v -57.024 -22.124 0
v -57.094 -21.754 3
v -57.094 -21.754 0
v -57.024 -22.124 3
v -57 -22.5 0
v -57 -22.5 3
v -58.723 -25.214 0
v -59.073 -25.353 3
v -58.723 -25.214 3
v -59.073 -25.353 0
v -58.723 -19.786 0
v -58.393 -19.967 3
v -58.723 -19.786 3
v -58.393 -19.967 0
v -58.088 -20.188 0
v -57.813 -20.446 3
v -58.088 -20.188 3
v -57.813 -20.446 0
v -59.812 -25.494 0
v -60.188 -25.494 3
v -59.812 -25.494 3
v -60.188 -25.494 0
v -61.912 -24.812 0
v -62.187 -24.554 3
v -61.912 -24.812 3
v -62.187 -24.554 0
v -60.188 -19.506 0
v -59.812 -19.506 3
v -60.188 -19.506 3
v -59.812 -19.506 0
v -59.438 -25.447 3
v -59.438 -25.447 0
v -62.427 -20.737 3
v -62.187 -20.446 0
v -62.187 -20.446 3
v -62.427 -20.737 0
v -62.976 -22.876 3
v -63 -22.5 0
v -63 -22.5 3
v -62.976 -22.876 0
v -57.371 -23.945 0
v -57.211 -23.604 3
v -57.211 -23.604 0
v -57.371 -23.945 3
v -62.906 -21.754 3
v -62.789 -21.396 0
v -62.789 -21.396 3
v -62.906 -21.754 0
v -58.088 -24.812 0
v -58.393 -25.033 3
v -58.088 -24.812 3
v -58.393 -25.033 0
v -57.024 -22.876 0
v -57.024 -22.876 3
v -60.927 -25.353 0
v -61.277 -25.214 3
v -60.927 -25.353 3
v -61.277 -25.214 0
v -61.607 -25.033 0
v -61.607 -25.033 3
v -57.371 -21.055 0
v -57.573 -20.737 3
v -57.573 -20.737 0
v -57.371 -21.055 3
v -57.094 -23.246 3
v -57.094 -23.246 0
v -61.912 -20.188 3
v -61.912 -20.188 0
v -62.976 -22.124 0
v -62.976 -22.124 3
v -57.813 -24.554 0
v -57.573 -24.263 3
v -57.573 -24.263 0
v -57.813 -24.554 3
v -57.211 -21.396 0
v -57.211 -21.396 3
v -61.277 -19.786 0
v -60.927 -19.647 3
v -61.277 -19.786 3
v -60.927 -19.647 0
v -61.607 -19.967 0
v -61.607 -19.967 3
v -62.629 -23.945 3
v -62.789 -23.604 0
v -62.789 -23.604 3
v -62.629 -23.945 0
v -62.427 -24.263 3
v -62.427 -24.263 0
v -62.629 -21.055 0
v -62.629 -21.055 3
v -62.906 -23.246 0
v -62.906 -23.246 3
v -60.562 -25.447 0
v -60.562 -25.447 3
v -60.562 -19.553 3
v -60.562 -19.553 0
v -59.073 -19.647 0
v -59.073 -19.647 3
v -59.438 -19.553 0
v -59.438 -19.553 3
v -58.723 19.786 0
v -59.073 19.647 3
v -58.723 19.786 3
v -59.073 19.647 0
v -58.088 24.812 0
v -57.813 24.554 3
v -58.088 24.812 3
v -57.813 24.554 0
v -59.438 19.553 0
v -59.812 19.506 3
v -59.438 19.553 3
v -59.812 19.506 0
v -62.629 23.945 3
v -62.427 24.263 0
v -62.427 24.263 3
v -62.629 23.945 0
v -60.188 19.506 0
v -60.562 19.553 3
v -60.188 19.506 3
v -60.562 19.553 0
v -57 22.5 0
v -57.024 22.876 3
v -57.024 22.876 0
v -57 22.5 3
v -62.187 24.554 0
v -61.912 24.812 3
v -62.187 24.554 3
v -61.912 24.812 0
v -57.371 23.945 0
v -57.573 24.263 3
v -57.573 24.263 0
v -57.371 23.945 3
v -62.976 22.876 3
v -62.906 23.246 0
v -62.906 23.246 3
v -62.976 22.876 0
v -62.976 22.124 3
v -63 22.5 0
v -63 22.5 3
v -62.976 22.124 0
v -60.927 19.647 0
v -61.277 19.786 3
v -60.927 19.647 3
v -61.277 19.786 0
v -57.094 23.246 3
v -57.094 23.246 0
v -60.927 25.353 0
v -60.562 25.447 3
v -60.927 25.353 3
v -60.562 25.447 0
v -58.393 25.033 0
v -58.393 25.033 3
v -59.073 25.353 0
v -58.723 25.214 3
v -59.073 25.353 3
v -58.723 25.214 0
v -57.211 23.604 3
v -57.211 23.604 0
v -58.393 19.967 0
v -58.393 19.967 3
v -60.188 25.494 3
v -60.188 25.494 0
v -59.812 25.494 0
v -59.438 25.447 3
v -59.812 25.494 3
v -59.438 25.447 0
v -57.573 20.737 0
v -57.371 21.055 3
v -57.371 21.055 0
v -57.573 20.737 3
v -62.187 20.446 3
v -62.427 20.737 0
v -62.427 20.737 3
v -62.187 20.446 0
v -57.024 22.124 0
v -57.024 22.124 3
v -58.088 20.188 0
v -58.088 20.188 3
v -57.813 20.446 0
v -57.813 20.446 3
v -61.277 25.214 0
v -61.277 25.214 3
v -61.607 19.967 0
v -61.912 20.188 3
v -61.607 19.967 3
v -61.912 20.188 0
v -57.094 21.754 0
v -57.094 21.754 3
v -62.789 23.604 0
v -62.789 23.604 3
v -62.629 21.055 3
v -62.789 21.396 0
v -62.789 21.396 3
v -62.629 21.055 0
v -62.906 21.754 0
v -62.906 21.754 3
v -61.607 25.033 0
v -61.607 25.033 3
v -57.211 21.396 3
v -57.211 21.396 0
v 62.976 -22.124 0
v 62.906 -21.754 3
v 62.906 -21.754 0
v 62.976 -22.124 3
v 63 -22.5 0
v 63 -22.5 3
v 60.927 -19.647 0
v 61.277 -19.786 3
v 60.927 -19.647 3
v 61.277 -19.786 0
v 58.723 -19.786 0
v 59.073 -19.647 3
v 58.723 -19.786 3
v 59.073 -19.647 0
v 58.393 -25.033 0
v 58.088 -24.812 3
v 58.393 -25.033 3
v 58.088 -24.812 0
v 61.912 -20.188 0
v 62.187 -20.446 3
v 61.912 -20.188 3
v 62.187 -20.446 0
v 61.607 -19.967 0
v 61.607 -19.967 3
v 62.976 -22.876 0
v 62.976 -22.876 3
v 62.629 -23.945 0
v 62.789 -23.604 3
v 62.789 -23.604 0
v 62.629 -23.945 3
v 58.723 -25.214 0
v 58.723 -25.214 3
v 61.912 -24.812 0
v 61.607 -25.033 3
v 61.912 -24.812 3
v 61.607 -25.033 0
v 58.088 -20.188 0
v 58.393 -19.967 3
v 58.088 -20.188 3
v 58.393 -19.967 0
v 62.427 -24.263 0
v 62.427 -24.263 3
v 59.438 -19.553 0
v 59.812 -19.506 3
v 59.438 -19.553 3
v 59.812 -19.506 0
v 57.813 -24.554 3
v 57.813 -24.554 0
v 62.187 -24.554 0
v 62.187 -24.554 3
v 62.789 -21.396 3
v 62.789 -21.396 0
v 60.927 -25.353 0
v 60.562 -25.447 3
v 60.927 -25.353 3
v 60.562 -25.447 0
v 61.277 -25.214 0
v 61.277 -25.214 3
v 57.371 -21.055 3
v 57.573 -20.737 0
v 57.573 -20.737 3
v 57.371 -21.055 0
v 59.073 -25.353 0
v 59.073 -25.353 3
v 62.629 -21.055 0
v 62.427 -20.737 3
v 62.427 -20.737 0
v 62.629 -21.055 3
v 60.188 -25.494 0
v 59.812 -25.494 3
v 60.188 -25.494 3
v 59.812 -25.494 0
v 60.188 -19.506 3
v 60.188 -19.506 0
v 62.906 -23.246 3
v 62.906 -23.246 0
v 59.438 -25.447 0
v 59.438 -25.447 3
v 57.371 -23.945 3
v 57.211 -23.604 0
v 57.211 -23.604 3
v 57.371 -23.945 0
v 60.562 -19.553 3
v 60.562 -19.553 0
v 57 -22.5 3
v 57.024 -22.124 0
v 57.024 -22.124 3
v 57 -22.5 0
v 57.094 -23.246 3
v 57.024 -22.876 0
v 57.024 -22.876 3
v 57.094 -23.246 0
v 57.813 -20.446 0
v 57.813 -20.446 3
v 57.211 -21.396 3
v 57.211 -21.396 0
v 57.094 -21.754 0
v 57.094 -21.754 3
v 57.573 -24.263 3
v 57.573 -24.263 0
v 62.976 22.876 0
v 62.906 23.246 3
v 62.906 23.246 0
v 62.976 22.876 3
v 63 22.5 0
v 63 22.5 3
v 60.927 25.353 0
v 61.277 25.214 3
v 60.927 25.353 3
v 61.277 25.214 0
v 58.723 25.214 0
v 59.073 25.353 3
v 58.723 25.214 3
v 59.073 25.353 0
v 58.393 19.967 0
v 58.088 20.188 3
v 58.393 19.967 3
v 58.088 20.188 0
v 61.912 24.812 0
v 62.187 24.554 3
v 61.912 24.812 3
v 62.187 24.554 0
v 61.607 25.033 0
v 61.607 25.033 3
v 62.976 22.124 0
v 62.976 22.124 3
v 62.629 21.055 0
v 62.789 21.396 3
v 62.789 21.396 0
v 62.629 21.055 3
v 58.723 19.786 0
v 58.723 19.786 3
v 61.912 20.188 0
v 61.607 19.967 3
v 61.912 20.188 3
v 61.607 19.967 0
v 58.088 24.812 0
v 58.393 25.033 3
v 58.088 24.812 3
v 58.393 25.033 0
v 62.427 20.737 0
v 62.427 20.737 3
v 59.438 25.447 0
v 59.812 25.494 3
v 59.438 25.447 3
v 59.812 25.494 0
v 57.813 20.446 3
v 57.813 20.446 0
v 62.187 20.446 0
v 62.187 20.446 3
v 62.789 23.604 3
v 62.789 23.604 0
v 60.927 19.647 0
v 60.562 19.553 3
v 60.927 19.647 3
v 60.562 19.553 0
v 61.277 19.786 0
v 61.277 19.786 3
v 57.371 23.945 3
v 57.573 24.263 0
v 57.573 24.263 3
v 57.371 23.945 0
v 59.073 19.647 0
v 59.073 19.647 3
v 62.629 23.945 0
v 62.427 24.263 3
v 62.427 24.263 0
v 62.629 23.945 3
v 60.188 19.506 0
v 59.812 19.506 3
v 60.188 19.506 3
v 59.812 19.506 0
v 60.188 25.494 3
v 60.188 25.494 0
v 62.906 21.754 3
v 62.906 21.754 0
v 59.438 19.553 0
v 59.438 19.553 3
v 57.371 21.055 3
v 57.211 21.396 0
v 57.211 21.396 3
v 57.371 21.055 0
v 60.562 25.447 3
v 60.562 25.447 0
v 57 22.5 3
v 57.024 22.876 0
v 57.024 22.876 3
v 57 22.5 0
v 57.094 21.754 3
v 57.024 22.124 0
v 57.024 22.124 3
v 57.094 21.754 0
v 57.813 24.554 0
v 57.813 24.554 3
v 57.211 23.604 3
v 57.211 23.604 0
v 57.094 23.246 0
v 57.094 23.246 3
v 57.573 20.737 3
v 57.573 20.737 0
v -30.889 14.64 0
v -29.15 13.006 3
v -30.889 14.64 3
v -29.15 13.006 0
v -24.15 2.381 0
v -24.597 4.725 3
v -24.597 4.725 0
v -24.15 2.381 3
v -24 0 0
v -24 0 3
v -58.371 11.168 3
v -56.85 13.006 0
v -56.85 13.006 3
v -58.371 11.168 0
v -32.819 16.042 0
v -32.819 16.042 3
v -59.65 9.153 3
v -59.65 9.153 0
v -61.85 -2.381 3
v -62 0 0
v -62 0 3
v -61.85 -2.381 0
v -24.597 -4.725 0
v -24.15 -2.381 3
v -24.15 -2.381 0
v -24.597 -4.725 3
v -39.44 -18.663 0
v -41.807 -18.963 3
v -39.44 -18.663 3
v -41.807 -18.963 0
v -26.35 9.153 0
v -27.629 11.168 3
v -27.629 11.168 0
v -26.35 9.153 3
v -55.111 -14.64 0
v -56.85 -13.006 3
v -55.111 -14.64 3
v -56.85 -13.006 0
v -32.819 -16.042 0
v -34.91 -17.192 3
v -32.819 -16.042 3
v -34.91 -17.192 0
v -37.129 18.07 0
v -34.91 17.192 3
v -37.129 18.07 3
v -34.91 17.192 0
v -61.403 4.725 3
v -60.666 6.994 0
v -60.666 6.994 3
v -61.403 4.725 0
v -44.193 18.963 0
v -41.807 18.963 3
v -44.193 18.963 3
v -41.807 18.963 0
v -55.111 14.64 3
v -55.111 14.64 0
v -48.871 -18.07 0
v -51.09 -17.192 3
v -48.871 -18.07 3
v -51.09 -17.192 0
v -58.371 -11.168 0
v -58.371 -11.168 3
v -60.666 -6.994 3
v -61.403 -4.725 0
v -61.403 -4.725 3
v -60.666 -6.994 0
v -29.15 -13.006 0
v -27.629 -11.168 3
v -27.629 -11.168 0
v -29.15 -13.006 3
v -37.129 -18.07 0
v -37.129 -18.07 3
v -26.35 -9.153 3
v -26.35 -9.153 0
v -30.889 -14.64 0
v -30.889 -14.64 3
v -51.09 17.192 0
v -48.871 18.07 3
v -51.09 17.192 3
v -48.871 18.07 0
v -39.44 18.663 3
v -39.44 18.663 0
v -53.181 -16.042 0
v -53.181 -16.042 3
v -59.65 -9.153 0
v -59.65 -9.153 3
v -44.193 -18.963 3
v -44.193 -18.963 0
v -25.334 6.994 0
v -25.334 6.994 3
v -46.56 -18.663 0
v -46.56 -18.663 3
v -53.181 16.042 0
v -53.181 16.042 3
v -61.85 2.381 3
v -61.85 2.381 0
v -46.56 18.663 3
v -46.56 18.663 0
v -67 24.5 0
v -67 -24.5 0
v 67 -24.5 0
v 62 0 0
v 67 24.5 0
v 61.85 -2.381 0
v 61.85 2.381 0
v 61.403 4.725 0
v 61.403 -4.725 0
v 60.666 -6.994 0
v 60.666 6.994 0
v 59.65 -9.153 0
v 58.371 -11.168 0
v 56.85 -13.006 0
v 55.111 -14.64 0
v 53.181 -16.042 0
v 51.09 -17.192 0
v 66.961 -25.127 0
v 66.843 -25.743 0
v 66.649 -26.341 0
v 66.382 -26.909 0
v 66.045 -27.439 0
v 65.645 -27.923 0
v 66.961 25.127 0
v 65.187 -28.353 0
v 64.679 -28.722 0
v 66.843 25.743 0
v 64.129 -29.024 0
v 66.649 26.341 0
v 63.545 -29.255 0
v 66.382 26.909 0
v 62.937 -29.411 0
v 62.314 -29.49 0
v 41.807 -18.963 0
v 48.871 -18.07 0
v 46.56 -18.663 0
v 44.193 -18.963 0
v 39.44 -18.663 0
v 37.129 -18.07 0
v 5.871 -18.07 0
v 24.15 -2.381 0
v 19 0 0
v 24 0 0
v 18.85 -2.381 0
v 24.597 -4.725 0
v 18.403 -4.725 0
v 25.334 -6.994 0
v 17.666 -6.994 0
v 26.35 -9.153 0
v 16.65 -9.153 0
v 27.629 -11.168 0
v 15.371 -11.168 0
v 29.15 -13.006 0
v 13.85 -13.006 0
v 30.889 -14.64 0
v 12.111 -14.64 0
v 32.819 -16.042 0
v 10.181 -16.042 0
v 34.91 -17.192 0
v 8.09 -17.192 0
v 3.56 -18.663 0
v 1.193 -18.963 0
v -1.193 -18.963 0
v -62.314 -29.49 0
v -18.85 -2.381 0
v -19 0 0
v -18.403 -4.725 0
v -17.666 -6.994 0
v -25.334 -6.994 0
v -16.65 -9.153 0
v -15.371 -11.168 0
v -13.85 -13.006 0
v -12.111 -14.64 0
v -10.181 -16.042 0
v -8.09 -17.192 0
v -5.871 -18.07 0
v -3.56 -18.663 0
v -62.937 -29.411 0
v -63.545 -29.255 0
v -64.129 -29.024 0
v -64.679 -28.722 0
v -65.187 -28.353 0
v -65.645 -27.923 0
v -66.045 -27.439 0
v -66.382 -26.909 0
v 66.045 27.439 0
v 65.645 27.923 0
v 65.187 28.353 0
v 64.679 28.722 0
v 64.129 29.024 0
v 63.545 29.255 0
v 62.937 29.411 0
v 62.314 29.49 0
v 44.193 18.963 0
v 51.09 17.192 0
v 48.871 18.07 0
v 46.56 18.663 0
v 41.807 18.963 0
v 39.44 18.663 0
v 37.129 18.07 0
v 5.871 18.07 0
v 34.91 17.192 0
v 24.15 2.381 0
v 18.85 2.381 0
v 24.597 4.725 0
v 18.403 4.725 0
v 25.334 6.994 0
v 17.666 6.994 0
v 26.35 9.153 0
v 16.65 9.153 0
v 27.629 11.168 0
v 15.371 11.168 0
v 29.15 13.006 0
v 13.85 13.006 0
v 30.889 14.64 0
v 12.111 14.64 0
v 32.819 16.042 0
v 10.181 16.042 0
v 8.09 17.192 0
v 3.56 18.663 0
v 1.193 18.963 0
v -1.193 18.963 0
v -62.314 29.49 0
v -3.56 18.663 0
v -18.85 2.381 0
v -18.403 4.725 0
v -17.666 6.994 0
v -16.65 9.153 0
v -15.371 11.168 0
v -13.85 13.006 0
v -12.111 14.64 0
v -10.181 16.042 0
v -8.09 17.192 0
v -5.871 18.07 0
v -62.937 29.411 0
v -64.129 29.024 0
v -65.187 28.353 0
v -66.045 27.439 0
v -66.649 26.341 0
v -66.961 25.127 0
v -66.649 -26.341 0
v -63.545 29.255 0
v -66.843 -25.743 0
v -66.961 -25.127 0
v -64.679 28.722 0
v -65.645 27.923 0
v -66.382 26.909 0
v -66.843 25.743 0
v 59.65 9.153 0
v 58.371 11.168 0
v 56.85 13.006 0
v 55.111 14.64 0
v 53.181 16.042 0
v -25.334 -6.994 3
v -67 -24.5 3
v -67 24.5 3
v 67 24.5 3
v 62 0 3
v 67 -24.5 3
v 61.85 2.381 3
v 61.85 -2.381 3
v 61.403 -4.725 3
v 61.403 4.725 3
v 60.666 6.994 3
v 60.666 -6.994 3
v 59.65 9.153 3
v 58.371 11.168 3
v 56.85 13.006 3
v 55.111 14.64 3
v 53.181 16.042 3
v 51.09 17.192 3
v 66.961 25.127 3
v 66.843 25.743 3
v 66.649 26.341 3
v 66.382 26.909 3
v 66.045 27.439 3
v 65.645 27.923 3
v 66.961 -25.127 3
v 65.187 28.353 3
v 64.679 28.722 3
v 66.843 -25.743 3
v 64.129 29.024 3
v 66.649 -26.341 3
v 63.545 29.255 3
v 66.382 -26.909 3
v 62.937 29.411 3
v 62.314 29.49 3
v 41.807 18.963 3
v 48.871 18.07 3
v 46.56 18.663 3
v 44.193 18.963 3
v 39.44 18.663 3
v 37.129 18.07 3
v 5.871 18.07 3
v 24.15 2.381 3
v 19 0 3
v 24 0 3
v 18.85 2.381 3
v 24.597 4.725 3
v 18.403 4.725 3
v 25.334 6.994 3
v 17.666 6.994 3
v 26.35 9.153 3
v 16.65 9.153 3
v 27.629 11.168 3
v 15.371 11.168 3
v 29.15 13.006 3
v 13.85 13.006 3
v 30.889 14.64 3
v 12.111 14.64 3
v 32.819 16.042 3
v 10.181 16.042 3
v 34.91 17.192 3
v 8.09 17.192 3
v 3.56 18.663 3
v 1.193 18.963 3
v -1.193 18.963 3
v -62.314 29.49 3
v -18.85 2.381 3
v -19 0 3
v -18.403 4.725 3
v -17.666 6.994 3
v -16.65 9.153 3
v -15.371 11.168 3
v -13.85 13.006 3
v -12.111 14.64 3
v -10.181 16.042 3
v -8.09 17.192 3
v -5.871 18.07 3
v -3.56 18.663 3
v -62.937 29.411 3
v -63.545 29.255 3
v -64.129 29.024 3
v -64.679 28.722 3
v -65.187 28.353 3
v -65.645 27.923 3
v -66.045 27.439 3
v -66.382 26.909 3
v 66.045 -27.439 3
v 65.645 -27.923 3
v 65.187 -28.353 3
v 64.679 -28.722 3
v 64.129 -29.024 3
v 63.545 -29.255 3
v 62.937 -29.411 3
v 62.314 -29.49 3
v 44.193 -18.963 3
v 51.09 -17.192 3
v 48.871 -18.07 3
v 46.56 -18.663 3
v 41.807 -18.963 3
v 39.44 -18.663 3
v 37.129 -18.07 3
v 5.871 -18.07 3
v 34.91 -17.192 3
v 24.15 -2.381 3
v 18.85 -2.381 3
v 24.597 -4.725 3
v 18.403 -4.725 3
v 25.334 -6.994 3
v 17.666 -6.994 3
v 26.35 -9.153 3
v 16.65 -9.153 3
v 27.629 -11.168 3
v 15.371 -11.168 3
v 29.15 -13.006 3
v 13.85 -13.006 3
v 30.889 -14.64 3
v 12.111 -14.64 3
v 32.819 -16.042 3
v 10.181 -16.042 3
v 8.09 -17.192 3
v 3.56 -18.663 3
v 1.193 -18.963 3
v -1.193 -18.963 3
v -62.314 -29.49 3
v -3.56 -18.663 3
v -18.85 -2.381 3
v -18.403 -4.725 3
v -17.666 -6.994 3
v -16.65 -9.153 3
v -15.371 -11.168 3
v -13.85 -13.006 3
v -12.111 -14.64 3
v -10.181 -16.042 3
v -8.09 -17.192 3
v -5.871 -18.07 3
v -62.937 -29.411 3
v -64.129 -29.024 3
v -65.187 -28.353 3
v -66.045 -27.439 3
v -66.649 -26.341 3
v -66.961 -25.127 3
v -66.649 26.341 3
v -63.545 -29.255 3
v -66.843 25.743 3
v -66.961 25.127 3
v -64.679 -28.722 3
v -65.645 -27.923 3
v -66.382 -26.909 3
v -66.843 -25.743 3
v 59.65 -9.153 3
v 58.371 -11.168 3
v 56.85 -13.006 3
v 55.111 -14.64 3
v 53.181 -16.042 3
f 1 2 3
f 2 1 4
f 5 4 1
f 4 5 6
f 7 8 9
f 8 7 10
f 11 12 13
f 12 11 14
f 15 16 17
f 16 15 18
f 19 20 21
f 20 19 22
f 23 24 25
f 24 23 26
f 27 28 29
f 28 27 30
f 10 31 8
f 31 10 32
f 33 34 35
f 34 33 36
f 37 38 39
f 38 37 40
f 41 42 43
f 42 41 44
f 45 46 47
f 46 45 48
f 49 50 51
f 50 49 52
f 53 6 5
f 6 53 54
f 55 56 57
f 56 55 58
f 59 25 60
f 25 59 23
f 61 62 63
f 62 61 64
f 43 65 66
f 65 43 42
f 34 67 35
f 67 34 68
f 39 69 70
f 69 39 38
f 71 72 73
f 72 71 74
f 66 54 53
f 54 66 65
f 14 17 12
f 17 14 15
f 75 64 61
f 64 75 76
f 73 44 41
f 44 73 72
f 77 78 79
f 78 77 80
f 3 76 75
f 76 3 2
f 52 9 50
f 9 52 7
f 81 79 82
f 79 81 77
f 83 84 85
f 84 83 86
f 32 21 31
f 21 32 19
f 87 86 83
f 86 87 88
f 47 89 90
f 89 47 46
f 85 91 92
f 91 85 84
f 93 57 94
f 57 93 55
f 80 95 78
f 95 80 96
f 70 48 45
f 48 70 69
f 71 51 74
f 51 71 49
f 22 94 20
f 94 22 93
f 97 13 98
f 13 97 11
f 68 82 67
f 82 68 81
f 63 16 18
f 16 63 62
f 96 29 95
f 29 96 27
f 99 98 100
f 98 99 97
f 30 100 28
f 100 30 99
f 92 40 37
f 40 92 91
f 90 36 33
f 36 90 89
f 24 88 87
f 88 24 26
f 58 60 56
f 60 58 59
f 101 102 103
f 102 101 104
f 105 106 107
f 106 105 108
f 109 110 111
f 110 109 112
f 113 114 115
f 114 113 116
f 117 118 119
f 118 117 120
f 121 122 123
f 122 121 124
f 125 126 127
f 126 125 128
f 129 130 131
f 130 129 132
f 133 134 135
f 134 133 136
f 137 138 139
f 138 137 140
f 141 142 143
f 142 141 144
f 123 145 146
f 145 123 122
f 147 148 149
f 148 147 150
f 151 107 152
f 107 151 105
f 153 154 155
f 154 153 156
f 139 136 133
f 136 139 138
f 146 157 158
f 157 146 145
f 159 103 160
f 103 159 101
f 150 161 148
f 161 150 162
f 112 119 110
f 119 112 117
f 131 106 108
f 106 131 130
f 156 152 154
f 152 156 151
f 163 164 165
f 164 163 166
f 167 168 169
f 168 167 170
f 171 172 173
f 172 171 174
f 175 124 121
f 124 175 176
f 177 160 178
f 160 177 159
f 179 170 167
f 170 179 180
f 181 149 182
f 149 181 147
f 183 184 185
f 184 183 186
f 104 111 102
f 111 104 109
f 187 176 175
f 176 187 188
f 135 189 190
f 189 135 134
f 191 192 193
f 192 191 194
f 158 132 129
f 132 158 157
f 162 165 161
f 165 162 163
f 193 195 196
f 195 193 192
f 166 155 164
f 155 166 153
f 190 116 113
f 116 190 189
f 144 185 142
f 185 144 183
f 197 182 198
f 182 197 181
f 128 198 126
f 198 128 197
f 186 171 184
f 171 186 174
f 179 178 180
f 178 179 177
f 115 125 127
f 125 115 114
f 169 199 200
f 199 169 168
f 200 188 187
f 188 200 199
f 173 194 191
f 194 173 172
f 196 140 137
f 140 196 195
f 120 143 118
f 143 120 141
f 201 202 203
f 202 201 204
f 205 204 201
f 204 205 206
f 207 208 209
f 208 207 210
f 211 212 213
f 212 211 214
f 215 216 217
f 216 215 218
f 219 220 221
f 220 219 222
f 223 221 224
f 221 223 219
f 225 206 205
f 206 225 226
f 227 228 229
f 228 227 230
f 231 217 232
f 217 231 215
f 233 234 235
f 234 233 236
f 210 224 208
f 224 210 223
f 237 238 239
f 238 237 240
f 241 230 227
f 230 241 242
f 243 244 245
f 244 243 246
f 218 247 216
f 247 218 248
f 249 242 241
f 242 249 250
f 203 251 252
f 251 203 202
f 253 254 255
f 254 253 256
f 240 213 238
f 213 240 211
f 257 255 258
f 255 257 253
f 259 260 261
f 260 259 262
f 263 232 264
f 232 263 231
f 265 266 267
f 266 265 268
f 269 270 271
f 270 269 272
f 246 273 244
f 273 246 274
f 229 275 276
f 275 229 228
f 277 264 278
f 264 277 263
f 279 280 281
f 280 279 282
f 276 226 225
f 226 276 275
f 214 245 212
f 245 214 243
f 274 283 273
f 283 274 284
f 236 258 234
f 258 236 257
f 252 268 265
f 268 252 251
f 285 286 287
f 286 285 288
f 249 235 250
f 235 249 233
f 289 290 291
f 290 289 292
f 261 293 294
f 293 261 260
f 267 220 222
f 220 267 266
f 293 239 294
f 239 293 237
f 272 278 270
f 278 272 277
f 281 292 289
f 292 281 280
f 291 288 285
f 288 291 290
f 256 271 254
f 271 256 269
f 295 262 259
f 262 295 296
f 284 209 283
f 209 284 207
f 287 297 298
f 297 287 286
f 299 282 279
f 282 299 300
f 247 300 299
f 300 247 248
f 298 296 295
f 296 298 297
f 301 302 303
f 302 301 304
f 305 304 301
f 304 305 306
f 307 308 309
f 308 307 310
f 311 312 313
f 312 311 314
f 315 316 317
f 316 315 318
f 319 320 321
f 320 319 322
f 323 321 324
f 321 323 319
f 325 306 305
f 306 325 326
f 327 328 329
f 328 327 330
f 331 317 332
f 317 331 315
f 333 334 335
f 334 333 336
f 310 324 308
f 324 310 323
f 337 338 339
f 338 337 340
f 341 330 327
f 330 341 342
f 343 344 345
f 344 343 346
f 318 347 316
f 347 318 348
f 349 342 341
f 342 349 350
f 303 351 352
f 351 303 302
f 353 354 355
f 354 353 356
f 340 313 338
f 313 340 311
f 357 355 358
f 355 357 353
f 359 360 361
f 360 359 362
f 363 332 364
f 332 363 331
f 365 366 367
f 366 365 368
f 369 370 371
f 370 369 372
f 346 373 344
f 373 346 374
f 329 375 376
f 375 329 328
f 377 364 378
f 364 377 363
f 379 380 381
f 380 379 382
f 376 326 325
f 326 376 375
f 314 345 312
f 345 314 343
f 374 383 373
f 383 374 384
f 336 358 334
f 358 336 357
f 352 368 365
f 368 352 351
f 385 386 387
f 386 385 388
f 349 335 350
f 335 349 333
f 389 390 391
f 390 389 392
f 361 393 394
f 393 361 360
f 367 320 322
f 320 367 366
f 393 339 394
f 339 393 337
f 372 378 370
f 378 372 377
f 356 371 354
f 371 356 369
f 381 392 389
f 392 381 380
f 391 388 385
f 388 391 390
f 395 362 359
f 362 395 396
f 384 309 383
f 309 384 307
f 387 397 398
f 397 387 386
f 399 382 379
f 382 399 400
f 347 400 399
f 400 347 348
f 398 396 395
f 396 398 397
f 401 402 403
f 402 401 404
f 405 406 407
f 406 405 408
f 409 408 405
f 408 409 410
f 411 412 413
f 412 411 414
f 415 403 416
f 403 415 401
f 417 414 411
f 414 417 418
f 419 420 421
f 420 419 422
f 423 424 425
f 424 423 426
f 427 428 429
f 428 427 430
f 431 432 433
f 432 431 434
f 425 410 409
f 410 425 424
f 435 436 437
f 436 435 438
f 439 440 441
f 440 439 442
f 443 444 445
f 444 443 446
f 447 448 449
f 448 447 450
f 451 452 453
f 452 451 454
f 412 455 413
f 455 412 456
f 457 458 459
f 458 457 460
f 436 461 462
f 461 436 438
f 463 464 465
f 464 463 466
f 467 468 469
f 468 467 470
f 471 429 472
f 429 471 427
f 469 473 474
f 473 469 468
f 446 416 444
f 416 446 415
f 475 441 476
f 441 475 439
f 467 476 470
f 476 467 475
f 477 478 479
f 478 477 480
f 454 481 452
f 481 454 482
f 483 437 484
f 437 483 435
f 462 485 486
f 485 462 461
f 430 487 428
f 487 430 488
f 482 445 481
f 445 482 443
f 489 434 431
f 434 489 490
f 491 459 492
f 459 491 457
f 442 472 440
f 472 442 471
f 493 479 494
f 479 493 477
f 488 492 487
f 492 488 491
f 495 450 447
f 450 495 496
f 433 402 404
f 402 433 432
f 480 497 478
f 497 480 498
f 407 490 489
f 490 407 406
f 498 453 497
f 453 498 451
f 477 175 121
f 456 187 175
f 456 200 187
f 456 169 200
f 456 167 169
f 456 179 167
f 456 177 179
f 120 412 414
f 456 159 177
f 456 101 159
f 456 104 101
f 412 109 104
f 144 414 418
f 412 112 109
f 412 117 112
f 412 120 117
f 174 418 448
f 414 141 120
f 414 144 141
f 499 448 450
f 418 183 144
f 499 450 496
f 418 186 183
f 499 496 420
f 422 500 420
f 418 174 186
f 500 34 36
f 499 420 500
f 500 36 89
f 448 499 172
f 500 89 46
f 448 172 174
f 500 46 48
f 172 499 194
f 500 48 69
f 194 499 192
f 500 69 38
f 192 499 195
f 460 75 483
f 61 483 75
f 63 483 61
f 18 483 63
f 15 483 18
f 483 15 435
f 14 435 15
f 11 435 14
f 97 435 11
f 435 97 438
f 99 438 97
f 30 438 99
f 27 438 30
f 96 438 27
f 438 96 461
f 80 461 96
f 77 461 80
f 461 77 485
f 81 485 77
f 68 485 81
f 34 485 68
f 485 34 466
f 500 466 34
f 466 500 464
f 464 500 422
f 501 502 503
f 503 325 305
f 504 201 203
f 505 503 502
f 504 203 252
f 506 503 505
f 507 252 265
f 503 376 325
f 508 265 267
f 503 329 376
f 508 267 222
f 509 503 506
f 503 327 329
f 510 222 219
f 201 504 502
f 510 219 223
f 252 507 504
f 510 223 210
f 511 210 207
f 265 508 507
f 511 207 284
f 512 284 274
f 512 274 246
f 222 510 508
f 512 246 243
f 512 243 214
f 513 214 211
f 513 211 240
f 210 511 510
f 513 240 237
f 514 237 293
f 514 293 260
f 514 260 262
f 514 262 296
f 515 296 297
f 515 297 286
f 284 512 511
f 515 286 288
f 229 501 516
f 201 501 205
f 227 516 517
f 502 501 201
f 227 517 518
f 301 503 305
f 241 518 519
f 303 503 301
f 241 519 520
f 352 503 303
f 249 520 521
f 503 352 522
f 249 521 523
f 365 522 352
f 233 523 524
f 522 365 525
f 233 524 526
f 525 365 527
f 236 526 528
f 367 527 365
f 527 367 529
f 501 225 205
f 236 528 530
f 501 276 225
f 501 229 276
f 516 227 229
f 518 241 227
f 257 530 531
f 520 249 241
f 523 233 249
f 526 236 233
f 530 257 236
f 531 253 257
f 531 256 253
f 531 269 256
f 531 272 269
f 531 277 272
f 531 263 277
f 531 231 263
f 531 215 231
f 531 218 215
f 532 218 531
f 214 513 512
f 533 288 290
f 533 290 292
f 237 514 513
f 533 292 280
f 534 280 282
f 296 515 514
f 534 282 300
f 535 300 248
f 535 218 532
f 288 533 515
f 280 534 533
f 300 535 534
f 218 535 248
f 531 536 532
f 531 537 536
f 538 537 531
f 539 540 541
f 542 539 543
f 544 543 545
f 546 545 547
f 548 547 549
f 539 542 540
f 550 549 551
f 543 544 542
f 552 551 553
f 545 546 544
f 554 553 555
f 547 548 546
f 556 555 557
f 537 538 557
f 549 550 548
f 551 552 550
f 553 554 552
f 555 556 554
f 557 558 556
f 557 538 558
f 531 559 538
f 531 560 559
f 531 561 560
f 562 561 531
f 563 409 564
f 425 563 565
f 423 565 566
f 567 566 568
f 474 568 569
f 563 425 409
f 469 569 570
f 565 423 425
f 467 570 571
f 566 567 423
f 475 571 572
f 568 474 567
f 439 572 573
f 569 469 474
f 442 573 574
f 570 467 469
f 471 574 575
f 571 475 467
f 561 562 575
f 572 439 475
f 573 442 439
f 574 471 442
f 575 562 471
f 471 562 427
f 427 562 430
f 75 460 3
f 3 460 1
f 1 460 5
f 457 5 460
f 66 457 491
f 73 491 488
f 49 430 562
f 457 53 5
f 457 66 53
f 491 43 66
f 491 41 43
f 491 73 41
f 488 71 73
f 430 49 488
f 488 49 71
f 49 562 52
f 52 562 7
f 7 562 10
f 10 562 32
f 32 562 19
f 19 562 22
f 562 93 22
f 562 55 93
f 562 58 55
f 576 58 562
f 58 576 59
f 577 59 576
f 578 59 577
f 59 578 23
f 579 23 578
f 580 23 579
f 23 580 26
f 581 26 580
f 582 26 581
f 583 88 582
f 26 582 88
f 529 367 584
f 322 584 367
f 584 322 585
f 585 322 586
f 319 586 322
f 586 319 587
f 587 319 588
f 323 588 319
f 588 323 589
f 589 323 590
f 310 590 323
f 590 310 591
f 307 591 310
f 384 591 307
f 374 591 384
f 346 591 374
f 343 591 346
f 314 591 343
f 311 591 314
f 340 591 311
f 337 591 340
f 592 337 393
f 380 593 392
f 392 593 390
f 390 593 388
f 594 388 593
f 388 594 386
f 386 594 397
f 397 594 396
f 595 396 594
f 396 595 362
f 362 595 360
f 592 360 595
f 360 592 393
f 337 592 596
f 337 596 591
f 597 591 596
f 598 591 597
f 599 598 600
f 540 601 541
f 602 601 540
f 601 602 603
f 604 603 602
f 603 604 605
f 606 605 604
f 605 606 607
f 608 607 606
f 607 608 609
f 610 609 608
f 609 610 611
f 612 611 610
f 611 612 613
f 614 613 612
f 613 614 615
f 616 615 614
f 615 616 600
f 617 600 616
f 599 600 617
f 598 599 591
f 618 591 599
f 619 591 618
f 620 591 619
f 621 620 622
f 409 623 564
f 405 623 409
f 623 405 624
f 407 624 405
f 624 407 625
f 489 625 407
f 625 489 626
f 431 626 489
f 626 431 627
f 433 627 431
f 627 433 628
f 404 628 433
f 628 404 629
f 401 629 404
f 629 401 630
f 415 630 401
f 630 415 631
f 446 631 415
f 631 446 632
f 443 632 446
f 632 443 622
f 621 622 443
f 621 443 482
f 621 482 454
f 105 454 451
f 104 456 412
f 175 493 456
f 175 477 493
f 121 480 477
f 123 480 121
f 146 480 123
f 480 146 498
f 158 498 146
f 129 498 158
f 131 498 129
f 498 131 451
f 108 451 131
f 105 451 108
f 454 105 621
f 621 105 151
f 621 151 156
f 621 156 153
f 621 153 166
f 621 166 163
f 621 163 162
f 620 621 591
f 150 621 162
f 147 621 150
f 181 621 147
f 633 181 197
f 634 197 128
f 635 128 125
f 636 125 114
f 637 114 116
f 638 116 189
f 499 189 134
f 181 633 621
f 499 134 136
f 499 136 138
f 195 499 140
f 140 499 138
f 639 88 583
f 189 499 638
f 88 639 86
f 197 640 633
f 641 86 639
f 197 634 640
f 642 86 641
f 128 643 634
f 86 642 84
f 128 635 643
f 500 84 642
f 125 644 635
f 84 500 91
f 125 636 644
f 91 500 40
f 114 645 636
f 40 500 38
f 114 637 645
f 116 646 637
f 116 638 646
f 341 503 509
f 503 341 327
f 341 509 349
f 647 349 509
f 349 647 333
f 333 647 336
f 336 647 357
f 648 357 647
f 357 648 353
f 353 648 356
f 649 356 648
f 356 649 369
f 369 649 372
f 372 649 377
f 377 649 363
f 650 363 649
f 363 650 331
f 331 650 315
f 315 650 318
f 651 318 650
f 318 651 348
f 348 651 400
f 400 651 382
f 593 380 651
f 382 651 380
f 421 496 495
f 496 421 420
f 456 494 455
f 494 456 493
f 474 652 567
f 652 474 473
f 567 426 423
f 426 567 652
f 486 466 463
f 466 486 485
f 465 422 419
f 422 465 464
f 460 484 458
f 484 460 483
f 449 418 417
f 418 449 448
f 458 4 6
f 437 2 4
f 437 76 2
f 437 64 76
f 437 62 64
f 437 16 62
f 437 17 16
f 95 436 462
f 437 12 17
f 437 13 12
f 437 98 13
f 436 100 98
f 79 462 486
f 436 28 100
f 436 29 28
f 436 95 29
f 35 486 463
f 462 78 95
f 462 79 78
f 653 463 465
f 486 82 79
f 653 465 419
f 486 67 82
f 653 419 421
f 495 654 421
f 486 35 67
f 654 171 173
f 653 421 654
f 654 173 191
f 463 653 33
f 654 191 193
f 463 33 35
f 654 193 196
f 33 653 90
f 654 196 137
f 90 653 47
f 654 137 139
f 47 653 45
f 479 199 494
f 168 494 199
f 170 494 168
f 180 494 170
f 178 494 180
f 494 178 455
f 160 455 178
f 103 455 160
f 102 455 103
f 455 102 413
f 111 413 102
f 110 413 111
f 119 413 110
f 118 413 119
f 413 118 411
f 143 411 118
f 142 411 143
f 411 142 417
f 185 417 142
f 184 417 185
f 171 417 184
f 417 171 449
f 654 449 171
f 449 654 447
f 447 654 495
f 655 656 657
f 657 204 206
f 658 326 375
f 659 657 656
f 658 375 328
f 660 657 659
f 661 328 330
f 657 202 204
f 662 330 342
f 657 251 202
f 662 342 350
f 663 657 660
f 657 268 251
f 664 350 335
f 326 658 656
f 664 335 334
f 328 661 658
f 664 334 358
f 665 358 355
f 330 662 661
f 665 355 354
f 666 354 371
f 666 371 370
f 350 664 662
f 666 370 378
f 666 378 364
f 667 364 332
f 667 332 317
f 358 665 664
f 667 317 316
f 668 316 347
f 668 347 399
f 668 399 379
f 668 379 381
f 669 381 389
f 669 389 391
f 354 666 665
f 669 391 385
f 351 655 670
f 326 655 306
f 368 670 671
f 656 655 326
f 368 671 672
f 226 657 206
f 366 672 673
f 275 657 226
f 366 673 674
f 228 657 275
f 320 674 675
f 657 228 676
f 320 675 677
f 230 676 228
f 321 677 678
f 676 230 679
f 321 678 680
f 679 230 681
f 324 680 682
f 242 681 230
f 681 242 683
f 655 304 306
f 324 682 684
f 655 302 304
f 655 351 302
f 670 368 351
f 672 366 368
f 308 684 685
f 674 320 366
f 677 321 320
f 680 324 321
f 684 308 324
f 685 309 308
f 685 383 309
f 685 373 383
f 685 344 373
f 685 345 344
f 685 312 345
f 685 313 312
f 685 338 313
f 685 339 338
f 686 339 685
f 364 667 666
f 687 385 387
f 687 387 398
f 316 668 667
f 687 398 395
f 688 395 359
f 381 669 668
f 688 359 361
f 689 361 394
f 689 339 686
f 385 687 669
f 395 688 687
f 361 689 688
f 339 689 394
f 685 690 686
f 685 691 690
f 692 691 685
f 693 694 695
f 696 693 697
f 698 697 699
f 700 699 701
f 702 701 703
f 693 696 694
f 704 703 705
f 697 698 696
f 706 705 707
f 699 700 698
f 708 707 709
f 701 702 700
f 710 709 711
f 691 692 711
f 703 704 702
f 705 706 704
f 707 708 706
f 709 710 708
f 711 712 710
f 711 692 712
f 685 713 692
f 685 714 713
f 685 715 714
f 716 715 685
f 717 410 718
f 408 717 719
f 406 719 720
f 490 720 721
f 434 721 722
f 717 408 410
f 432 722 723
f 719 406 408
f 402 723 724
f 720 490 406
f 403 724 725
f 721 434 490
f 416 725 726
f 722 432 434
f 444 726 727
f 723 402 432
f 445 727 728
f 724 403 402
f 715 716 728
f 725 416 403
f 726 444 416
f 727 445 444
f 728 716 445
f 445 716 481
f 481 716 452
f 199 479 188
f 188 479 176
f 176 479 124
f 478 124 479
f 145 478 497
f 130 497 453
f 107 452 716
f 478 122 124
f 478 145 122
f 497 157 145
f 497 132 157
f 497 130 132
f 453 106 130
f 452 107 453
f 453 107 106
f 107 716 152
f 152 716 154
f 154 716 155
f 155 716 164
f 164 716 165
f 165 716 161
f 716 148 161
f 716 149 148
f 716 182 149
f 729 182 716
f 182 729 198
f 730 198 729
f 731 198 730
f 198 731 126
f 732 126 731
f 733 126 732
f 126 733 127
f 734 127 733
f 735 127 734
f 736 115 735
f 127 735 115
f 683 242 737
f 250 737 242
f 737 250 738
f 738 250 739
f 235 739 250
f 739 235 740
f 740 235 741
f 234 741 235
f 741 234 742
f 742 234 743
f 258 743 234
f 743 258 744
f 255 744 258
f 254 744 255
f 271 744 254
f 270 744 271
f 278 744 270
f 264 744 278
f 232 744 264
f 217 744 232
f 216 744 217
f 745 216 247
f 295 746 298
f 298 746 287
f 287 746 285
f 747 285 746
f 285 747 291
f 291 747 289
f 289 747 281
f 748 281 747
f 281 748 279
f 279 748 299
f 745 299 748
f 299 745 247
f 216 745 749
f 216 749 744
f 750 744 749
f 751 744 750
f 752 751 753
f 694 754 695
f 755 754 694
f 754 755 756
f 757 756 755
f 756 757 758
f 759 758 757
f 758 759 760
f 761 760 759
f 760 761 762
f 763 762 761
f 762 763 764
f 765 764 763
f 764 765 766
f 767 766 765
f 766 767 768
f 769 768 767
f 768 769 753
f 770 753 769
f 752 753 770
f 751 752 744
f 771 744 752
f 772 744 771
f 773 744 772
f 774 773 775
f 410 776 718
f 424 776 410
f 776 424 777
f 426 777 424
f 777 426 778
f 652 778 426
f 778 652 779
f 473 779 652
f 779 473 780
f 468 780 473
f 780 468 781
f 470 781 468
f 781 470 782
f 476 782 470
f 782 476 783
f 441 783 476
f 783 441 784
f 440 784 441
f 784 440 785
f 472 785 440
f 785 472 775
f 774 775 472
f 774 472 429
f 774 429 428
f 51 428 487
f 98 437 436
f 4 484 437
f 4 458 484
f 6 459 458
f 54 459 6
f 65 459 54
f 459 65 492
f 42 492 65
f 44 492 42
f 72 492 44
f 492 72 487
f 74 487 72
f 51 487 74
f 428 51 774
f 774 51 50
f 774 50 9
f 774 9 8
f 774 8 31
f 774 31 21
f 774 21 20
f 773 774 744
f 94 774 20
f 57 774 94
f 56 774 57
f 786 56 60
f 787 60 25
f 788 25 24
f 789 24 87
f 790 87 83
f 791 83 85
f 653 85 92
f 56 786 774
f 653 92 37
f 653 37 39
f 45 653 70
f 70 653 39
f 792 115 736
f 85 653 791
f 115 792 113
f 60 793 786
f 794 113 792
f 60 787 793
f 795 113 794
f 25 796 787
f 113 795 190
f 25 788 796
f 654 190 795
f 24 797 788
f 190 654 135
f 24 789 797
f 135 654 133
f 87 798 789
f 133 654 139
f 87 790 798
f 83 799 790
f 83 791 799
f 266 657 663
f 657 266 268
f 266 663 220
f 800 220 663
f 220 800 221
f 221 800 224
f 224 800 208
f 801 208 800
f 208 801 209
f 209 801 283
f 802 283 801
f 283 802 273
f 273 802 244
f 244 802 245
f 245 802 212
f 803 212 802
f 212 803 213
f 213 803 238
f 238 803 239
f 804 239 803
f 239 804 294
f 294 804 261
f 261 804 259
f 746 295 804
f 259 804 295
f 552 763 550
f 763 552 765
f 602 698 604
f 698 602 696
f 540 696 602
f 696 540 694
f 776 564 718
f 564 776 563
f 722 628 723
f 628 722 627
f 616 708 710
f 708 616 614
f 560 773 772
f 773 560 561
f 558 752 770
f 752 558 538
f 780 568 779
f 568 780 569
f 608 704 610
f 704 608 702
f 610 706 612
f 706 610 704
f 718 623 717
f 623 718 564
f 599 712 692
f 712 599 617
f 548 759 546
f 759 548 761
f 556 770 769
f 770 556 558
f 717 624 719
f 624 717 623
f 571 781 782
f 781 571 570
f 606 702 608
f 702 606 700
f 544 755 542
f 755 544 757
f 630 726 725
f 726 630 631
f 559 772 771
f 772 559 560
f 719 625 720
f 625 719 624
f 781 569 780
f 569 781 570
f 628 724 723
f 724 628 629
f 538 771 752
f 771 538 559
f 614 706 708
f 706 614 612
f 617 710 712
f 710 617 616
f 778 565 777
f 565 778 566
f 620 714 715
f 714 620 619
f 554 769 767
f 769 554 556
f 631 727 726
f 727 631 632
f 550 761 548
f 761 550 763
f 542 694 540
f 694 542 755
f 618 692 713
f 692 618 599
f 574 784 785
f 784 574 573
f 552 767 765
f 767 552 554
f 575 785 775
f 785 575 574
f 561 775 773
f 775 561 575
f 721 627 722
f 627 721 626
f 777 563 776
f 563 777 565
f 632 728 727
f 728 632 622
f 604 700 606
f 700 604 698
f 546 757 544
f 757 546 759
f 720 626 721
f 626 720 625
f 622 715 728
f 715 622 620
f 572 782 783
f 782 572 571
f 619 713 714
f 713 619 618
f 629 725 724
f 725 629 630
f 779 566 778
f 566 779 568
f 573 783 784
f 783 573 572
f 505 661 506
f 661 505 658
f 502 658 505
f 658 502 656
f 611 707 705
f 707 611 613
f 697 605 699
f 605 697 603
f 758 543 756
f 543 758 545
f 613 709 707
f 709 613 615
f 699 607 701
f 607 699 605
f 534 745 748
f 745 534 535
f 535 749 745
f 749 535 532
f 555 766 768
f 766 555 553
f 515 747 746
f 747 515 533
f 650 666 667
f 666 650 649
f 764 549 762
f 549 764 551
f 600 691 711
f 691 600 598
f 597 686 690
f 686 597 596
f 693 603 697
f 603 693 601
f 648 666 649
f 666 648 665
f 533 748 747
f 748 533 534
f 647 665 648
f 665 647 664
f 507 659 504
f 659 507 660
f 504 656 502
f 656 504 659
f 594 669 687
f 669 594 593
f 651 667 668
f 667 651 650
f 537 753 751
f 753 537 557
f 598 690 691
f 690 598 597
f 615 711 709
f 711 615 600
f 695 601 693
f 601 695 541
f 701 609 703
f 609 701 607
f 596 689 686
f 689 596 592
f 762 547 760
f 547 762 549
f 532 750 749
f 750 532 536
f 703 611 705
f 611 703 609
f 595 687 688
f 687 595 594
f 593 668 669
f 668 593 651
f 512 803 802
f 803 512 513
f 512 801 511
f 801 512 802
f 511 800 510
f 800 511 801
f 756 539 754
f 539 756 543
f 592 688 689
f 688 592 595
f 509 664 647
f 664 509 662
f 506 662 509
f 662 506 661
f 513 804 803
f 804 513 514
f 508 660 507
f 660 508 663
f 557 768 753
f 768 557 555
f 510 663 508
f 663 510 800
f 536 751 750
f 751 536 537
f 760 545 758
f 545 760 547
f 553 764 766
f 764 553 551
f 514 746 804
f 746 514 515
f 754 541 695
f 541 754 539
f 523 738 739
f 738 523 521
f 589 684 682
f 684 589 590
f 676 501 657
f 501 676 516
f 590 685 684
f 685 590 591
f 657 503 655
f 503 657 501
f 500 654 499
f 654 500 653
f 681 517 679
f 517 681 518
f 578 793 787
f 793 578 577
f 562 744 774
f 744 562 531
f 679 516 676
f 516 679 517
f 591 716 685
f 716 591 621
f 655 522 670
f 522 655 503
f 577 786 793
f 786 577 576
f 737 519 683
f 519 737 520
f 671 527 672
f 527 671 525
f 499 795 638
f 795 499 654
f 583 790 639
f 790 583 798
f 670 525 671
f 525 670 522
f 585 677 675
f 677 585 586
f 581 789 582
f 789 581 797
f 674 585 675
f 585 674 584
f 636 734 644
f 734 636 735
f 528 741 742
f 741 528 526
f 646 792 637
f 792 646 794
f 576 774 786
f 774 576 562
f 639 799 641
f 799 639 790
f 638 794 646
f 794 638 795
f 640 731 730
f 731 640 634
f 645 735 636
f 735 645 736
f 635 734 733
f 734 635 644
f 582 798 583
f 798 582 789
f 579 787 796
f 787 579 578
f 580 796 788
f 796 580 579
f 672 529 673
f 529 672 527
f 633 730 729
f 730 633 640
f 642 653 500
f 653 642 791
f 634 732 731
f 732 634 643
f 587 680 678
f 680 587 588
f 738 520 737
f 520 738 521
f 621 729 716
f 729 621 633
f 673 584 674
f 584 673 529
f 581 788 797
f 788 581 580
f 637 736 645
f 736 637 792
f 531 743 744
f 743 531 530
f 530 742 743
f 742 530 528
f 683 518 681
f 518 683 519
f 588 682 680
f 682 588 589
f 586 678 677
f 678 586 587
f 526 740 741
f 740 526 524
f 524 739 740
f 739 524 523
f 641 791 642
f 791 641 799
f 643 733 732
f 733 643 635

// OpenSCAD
$fn = 50;


difference() {
	union() {
		hull() {
			translate(v = [-62.0000000000, 24.5000000000, 0]) {
				cylinder(h = 3, r = 5);
			}
			translate(v = [62.0000000000, 24.5000000000, 0]) {
				cylinder(h = 3, r = 5);
			}
			translate(v = [-62.0000000000, -24.5000000000, 0]) {
				cylinder(h = 3, r = 5);
			}
			translate(v = [62.0000000000, -24.5000000000, 0]) {
				cylinder(h = 3, r = 5);
			}
		}
	}
	union() {
		#translate(v = [-60.0000000000, -22.5000000000, -100.0000000000]) {
			cylinder(h = 200, r = 3.0000000000);
		}
		#translate(v = [-60.0000000000, 22.5000000000, -100.0000000000]) {
			cylinder(h = 200, r = 3.0000000000);
		}
		#translate(v = [60.0000000000, -22.5000000000, -100.0000000000]) {
			cylinder(h = 200, r = 3.0000000000);
		}
		#translate(v = [60.0000000000, 22.5000000000, -100.0000000000]) {
			cylinder(h = 200, r = 3.0000000000);
		}
		#translate(v = [-43.0000000000, 0, 0]) {
			cylinder(h = 3, r = 19.0000000000);
		}
		#cylinder(h = 3, r = 19.0000000000);
		#translate(v = [43.0000000000, 0, 0]) {
			cylinder(h = 3, r = 19.0000000000);
		}
	}
}
